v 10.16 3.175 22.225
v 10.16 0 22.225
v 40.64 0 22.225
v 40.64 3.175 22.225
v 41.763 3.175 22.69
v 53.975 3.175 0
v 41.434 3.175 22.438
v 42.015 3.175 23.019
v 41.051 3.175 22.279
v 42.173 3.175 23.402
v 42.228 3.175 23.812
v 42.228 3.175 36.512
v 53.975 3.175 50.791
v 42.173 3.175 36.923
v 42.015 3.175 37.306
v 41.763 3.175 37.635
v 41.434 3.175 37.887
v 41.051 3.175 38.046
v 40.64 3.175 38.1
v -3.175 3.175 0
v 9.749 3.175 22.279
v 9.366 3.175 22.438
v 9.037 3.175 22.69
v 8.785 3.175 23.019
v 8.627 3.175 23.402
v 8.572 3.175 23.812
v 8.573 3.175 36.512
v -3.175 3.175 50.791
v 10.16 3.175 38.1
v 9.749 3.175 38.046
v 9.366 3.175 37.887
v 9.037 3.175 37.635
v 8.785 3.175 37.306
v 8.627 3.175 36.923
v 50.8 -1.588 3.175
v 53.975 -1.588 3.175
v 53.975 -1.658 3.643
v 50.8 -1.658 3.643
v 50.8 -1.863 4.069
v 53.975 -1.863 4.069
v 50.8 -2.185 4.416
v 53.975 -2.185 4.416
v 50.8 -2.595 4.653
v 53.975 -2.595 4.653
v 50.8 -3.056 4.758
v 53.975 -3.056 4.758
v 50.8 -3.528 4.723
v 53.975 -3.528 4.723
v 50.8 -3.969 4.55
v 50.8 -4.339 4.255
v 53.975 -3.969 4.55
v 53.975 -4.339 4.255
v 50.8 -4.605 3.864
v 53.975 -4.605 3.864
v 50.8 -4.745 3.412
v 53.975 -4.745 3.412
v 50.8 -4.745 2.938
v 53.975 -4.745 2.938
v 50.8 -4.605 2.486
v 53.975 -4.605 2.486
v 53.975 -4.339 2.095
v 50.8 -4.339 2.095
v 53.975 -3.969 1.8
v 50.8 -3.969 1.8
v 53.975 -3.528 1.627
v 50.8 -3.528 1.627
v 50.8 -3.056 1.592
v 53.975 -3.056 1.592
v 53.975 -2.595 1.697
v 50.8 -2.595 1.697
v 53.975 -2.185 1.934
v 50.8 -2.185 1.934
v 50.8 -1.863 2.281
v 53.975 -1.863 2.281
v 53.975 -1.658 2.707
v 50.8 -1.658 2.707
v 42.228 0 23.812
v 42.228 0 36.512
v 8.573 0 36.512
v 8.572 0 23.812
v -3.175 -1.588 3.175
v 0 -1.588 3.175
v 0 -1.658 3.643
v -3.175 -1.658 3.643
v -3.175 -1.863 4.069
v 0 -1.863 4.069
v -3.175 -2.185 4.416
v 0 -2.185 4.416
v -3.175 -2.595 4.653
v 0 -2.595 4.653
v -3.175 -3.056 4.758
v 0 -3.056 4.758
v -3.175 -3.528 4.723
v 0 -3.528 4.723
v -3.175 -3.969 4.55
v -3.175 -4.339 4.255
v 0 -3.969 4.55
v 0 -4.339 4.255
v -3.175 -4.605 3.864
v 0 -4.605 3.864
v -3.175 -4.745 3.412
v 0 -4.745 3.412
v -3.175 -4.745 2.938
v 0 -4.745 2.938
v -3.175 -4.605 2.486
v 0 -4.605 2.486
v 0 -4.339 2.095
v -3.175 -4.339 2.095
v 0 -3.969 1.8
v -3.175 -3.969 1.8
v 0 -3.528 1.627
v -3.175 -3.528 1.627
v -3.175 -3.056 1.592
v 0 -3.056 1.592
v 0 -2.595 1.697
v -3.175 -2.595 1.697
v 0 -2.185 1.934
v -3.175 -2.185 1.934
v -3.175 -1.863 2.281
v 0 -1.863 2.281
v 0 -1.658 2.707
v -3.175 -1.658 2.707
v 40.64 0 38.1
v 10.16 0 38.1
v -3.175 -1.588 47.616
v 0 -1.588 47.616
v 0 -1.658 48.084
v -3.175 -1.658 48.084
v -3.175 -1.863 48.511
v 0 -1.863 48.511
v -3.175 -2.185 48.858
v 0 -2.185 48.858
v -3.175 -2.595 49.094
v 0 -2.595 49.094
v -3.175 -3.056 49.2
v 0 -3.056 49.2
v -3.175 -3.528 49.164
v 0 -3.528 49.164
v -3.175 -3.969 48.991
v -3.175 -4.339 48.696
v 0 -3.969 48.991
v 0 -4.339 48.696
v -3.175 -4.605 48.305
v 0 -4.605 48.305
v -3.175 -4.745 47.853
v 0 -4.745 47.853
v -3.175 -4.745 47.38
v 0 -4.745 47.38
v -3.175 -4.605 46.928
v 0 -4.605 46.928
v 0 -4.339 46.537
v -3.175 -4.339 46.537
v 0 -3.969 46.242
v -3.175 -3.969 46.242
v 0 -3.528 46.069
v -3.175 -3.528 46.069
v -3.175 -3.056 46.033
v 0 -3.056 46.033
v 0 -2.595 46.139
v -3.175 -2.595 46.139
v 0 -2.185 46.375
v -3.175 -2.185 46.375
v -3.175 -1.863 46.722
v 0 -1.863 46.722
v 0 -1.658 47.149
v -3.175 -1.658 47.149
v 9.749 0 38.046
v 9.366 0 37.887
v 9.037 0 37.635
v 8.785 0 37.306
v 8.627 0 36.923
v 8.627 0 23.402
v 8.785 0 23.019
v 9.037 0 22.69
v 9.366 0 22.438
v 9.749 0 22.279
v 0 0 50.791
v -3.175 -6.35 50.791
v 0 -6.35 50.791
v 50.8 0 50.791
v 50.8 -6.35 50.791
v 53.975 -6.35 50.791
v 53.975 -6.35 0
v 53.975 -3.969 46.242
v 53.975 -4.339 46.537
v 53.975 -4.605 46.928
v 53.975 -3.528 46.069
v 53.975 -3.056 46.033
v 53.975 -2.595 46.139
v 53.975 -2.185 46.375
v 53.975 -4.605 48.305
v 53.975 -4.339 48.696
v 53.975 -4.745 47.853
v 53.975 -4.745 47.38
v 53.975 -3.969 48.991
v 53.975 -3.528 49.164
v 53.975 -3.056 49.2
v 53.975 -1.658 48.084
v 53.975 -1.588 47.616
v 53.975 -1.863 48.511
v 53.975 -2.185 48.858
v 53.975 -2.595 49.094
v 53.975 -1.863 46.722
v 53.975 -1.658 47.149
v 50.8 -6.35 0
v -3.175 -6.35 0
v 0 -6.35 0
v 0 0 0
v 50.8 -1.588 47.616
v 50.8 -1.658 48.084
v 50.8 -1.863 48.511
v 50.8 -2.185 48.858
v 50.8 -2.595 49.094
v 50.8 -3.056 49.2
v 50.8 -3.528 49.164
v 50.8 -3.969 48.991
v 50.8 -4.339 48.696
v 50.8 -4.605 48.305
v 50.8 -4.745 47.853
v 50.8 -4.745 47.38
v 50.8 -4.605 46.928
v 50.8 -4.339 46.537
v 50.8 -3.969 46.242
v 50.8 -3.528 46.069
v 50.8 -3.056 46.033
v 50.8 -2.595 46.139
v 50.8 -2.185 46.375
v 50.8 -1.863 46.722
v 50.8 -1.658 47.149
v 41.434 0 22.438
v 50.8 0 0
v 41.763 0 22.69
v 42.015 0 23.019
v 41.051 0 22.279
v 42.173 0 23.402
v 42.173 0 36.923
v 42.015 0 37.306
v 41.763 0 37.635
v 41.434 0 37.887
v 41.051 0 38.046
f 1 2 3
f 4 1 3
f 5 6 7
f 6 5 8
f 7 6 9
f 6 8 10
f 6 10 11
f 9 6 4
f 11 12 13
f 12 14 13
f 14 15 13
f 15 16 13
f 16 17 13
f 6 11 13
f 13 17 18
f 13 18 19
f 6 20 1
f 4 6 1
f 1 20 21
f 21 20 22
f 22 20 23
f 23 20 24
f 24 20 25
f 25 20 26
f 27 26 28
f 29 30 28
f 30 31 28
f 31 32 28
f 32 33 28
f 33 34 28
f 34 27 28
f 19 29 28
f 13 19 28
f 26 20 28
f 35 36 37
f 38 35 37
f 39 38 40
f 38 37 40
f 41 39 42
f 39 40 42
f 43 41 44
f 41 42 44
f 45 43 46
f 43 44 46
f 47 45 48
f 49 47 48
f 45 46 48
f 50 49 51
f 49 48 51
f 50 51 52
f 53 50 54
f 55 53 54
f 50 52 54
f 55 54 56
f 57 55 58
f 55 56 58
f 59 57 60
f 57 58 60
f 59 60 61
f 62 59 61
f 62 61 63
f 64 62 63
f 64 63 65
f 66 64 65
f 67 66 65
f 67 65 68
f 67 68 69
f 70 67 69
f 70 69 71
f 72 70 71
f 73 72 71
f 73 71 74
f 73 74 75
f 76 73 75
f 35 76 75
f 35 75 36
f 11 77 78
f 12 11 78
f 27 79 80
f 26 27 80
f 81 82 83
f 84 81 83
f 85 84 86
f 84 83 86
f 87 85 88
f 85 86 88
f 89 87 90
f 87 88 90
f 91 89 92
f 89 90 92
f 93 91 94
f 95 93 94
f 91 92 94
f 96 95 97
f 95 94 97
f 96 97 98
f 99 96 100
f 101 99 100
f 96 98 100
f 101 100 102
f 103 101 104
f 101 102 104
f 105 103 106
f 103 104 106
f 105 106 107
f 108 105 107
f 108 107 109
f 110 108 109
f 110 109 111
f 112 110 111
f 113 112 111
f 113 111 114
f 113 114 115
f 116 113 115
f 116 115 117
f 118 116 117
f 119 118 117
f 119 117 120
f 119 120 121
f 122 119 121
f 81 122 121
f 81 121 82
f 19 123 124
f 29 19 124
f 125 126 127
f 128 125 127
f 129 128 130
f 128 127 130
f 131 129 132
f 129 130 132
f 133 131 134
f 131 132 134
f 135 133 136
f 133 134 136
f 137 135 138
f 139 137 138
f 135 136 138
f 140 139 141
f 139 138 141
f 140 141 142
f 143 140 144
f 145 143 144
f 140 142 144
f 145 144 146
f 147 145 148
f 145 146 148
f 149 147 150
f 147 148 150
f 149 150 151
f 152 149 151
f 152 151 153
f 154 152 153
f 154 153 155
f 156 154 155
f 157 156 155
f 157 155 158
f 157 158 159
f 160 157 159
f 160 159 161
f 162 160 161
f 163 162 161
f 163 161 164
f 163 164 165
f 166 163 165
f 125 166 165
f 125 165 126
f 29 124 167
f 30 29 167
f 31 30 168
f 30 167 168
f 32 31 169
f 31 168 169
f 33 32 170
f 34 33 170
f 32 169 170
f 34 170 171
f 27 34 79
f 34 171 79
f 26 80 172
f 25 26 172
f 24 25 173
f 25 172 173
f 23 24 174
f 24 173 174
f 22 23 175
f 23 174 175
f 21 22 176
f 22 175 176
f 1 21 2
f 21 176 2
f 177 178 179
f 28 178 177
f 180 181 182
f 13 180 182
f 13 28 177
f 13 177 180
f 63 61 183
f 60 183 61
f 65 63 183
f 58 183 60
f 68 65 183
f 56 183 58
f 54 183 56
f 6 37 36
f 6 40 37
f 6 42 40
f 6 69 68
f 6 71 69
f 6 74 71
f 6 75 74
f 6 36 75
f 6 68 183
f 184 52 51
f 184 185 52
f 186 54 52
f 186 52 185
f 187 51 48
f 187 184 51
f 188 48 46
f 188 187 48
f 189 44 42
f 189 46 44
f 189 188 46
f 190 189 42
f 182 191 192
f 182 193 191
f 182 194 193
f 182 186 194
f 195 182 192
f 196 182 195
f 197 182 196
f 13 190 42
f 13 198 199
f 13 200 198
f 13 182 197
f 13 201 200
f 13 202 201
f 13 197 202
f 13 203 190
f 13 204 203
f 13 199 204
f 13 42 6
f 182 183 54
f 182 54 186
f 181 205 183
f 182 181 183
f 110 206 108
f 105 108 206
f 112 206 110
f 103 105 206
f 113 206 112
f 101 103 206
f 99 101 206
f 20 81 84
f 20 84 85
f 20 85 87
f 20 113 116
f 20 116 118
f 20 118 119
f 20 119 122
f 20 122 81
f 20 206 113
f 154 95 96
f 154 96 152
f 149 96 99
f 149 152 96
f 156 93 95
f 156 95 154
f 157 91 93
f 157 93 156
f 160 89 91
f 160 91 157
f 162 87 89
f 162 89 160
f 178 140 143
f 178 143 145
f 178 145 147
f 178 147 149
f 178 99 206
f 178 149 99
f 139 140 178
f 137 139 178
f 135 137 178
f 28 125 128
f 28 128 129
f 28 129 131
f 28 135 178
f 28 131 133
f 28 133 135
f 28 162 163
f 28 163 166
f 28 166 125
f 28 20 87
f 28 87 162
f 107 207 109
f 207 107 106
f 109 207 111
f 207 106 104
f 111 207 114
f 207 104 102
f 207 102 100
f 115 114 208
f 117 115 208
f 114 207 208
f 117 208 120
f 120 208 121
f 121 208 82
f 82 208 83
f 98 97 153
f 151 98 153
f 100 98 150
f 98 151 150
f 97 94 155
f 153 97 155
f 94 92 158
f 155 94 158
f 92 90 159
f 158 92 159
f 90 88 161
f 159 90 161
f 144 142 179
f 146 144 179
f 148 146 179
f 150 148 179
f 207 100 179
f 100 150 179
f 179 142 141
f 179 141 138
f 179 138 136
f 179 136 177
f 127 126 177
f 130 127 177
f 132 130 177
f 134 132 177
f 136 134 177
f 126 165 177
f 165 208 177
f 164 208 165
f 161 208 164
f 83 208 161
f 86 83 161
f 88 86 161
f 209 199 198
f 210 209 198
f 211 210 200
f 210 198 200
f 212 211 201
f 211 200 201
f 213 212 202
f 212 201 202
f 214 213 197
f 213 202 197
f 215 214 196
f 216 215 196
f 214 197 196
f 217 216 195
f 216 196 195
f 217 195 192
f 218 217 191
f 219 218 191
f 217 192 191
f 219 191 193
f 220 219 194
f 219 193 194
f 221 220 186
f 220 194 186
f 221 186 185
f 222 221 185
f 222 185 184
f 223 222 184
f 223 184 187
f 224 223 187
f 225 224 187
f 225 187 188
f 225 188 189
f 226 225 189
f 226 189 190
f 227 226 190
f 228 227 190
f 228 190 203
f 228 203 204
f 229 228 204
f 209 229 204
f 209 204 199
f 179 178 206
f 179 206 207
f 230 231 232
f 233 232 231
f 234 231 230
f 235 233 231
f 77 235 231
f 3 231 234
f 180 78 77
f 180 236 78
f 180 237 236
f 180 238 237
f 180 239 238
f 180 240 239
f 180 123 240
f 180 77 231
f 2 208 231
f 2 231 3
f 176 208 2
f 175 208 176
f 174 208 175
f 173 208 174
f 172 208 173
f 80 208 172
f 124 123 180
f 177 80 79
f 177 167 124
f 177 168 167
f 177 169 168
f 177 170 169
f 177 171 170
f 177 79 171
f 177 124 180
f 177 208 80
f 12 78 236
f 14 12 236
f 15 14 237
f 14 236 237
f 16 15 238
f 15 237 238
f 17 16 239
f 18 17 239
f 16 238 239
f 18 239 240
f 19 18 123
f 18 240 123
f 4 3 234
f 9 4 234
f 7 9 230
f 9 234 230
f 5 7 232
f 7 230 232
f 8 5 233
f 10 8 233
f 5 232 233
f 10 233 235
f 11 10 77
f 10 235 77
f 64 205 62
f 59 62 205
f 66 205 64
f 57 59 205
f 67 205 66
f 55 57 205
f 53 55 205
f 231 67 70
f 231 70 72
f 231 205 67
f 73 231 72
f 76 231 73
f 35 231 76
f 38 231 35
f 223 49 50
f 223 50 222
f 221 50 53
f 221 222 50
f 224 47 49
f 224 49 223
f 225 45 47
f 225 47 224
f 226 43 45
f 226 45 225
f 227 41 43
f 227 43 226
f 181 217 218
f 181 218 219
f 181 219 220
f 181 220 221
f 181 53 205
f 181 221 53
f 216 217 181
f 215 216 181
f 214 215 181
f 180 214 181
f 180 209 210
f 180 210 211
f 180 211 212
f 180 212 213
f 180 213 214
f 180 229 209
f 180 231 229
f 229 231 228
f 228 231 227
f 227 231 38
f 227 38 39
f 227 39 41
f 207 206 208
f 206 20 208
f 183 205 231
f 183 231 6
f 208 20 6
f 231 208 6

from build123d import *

# Parameters (mm, degrees)
F0_W     = 3.175
F0_H     = 50.7914833724
F1_DEPTH = 50.8
F3_DEPTH = 3.176
F4_DEPTH = 3.175
F5_DEPTH = 3.175
F6_W     = 3.175
F6_H     = 50.7914833724
F7_DEPTH = 6.35
F8_R     = 1.5875
F9_DEPTH = 63.5


with BuildPart() as f1:
    # F0 (on Right) → F1 (new body)
    with BuildSketch(Plane.YZ):
        with Locations((1.5875, 25.3957416862)):
            Rectangle(F0_W, F0_H)
    extrude(amount=F1_DEPTH)

    # F2 (on face) → F3 (cut, through all)
    with BuildSketch(Plane.XZ):
        with BuildLine():
            Line((40.64, 38.1), (10.16, 38.1))
            ThreePointArc((10.16, 38.1), (9.0374679849, 37.6350320151), (8.5725, 36.5125))
            Line((8.5725, 36.5125), (8.5725, 23.8125))
            ThreePointArc((8.5725, 23.8125), (9.0374679849, 22.6899679849), (10.16, 22.225))
            Line((10.16, 22.225), (40.64, 22.225))
            ThreePointArc((40.64, 22.225), (41.7625320151, 22.6899679849), (42.2275, 23.8125))
            Line((42.2275, 23.8125), (42.2275, 36.5125))
            ThreePointArc((42.2275, 36.5125), (41.7625320151, 37.6350320151), (40.64, 38.1))
        make_face()
    extrude(amount=-F3_DEPTH, mode=Mode.SUBTRACT)

    # F4 (add): a face of the model
    f4_faces = [f1.faces().sort_by_distance(p)[0] for p in [
        (0, 1.5875, 25.3957416862),
    ]]
    extrude(f4_faces, amount=F4_DEPTH)

    # F5 (add): a face of the model
    f5_faces = [f1.faces().sort_by_distance(p)[0] for p in [
        (50.8, 1.5875, 25.3957416862),
    ]]
    extrude(f5_faces, amount=F5_DEPTH)

    # F6 (on face) → F7 (join)
    with BuildSketch(Plane.XZ):
        with Locations((-1.5875, 25.3957416862)):
            Rectangle(F6_W, F6_H)
        with Locations((52.3875, 25.3957416862)):
            Rectangle(F6_W, F6_H)
    extrude(amount=F7_DEPTH)

    # F8 (on face) → F9 (cut)
    with BuildSketch(Plane.YZ.offset(53.975)):
        with Locations((-3.175, 47.6164833724)):
            Circle(F8_R)
        with Locations((-3.175, 3.175)):
            Circle(F8_R)
    extrude(amount=-F9_DEPTH, mode=Mode.SUBTRACT)


solid = f1.part
